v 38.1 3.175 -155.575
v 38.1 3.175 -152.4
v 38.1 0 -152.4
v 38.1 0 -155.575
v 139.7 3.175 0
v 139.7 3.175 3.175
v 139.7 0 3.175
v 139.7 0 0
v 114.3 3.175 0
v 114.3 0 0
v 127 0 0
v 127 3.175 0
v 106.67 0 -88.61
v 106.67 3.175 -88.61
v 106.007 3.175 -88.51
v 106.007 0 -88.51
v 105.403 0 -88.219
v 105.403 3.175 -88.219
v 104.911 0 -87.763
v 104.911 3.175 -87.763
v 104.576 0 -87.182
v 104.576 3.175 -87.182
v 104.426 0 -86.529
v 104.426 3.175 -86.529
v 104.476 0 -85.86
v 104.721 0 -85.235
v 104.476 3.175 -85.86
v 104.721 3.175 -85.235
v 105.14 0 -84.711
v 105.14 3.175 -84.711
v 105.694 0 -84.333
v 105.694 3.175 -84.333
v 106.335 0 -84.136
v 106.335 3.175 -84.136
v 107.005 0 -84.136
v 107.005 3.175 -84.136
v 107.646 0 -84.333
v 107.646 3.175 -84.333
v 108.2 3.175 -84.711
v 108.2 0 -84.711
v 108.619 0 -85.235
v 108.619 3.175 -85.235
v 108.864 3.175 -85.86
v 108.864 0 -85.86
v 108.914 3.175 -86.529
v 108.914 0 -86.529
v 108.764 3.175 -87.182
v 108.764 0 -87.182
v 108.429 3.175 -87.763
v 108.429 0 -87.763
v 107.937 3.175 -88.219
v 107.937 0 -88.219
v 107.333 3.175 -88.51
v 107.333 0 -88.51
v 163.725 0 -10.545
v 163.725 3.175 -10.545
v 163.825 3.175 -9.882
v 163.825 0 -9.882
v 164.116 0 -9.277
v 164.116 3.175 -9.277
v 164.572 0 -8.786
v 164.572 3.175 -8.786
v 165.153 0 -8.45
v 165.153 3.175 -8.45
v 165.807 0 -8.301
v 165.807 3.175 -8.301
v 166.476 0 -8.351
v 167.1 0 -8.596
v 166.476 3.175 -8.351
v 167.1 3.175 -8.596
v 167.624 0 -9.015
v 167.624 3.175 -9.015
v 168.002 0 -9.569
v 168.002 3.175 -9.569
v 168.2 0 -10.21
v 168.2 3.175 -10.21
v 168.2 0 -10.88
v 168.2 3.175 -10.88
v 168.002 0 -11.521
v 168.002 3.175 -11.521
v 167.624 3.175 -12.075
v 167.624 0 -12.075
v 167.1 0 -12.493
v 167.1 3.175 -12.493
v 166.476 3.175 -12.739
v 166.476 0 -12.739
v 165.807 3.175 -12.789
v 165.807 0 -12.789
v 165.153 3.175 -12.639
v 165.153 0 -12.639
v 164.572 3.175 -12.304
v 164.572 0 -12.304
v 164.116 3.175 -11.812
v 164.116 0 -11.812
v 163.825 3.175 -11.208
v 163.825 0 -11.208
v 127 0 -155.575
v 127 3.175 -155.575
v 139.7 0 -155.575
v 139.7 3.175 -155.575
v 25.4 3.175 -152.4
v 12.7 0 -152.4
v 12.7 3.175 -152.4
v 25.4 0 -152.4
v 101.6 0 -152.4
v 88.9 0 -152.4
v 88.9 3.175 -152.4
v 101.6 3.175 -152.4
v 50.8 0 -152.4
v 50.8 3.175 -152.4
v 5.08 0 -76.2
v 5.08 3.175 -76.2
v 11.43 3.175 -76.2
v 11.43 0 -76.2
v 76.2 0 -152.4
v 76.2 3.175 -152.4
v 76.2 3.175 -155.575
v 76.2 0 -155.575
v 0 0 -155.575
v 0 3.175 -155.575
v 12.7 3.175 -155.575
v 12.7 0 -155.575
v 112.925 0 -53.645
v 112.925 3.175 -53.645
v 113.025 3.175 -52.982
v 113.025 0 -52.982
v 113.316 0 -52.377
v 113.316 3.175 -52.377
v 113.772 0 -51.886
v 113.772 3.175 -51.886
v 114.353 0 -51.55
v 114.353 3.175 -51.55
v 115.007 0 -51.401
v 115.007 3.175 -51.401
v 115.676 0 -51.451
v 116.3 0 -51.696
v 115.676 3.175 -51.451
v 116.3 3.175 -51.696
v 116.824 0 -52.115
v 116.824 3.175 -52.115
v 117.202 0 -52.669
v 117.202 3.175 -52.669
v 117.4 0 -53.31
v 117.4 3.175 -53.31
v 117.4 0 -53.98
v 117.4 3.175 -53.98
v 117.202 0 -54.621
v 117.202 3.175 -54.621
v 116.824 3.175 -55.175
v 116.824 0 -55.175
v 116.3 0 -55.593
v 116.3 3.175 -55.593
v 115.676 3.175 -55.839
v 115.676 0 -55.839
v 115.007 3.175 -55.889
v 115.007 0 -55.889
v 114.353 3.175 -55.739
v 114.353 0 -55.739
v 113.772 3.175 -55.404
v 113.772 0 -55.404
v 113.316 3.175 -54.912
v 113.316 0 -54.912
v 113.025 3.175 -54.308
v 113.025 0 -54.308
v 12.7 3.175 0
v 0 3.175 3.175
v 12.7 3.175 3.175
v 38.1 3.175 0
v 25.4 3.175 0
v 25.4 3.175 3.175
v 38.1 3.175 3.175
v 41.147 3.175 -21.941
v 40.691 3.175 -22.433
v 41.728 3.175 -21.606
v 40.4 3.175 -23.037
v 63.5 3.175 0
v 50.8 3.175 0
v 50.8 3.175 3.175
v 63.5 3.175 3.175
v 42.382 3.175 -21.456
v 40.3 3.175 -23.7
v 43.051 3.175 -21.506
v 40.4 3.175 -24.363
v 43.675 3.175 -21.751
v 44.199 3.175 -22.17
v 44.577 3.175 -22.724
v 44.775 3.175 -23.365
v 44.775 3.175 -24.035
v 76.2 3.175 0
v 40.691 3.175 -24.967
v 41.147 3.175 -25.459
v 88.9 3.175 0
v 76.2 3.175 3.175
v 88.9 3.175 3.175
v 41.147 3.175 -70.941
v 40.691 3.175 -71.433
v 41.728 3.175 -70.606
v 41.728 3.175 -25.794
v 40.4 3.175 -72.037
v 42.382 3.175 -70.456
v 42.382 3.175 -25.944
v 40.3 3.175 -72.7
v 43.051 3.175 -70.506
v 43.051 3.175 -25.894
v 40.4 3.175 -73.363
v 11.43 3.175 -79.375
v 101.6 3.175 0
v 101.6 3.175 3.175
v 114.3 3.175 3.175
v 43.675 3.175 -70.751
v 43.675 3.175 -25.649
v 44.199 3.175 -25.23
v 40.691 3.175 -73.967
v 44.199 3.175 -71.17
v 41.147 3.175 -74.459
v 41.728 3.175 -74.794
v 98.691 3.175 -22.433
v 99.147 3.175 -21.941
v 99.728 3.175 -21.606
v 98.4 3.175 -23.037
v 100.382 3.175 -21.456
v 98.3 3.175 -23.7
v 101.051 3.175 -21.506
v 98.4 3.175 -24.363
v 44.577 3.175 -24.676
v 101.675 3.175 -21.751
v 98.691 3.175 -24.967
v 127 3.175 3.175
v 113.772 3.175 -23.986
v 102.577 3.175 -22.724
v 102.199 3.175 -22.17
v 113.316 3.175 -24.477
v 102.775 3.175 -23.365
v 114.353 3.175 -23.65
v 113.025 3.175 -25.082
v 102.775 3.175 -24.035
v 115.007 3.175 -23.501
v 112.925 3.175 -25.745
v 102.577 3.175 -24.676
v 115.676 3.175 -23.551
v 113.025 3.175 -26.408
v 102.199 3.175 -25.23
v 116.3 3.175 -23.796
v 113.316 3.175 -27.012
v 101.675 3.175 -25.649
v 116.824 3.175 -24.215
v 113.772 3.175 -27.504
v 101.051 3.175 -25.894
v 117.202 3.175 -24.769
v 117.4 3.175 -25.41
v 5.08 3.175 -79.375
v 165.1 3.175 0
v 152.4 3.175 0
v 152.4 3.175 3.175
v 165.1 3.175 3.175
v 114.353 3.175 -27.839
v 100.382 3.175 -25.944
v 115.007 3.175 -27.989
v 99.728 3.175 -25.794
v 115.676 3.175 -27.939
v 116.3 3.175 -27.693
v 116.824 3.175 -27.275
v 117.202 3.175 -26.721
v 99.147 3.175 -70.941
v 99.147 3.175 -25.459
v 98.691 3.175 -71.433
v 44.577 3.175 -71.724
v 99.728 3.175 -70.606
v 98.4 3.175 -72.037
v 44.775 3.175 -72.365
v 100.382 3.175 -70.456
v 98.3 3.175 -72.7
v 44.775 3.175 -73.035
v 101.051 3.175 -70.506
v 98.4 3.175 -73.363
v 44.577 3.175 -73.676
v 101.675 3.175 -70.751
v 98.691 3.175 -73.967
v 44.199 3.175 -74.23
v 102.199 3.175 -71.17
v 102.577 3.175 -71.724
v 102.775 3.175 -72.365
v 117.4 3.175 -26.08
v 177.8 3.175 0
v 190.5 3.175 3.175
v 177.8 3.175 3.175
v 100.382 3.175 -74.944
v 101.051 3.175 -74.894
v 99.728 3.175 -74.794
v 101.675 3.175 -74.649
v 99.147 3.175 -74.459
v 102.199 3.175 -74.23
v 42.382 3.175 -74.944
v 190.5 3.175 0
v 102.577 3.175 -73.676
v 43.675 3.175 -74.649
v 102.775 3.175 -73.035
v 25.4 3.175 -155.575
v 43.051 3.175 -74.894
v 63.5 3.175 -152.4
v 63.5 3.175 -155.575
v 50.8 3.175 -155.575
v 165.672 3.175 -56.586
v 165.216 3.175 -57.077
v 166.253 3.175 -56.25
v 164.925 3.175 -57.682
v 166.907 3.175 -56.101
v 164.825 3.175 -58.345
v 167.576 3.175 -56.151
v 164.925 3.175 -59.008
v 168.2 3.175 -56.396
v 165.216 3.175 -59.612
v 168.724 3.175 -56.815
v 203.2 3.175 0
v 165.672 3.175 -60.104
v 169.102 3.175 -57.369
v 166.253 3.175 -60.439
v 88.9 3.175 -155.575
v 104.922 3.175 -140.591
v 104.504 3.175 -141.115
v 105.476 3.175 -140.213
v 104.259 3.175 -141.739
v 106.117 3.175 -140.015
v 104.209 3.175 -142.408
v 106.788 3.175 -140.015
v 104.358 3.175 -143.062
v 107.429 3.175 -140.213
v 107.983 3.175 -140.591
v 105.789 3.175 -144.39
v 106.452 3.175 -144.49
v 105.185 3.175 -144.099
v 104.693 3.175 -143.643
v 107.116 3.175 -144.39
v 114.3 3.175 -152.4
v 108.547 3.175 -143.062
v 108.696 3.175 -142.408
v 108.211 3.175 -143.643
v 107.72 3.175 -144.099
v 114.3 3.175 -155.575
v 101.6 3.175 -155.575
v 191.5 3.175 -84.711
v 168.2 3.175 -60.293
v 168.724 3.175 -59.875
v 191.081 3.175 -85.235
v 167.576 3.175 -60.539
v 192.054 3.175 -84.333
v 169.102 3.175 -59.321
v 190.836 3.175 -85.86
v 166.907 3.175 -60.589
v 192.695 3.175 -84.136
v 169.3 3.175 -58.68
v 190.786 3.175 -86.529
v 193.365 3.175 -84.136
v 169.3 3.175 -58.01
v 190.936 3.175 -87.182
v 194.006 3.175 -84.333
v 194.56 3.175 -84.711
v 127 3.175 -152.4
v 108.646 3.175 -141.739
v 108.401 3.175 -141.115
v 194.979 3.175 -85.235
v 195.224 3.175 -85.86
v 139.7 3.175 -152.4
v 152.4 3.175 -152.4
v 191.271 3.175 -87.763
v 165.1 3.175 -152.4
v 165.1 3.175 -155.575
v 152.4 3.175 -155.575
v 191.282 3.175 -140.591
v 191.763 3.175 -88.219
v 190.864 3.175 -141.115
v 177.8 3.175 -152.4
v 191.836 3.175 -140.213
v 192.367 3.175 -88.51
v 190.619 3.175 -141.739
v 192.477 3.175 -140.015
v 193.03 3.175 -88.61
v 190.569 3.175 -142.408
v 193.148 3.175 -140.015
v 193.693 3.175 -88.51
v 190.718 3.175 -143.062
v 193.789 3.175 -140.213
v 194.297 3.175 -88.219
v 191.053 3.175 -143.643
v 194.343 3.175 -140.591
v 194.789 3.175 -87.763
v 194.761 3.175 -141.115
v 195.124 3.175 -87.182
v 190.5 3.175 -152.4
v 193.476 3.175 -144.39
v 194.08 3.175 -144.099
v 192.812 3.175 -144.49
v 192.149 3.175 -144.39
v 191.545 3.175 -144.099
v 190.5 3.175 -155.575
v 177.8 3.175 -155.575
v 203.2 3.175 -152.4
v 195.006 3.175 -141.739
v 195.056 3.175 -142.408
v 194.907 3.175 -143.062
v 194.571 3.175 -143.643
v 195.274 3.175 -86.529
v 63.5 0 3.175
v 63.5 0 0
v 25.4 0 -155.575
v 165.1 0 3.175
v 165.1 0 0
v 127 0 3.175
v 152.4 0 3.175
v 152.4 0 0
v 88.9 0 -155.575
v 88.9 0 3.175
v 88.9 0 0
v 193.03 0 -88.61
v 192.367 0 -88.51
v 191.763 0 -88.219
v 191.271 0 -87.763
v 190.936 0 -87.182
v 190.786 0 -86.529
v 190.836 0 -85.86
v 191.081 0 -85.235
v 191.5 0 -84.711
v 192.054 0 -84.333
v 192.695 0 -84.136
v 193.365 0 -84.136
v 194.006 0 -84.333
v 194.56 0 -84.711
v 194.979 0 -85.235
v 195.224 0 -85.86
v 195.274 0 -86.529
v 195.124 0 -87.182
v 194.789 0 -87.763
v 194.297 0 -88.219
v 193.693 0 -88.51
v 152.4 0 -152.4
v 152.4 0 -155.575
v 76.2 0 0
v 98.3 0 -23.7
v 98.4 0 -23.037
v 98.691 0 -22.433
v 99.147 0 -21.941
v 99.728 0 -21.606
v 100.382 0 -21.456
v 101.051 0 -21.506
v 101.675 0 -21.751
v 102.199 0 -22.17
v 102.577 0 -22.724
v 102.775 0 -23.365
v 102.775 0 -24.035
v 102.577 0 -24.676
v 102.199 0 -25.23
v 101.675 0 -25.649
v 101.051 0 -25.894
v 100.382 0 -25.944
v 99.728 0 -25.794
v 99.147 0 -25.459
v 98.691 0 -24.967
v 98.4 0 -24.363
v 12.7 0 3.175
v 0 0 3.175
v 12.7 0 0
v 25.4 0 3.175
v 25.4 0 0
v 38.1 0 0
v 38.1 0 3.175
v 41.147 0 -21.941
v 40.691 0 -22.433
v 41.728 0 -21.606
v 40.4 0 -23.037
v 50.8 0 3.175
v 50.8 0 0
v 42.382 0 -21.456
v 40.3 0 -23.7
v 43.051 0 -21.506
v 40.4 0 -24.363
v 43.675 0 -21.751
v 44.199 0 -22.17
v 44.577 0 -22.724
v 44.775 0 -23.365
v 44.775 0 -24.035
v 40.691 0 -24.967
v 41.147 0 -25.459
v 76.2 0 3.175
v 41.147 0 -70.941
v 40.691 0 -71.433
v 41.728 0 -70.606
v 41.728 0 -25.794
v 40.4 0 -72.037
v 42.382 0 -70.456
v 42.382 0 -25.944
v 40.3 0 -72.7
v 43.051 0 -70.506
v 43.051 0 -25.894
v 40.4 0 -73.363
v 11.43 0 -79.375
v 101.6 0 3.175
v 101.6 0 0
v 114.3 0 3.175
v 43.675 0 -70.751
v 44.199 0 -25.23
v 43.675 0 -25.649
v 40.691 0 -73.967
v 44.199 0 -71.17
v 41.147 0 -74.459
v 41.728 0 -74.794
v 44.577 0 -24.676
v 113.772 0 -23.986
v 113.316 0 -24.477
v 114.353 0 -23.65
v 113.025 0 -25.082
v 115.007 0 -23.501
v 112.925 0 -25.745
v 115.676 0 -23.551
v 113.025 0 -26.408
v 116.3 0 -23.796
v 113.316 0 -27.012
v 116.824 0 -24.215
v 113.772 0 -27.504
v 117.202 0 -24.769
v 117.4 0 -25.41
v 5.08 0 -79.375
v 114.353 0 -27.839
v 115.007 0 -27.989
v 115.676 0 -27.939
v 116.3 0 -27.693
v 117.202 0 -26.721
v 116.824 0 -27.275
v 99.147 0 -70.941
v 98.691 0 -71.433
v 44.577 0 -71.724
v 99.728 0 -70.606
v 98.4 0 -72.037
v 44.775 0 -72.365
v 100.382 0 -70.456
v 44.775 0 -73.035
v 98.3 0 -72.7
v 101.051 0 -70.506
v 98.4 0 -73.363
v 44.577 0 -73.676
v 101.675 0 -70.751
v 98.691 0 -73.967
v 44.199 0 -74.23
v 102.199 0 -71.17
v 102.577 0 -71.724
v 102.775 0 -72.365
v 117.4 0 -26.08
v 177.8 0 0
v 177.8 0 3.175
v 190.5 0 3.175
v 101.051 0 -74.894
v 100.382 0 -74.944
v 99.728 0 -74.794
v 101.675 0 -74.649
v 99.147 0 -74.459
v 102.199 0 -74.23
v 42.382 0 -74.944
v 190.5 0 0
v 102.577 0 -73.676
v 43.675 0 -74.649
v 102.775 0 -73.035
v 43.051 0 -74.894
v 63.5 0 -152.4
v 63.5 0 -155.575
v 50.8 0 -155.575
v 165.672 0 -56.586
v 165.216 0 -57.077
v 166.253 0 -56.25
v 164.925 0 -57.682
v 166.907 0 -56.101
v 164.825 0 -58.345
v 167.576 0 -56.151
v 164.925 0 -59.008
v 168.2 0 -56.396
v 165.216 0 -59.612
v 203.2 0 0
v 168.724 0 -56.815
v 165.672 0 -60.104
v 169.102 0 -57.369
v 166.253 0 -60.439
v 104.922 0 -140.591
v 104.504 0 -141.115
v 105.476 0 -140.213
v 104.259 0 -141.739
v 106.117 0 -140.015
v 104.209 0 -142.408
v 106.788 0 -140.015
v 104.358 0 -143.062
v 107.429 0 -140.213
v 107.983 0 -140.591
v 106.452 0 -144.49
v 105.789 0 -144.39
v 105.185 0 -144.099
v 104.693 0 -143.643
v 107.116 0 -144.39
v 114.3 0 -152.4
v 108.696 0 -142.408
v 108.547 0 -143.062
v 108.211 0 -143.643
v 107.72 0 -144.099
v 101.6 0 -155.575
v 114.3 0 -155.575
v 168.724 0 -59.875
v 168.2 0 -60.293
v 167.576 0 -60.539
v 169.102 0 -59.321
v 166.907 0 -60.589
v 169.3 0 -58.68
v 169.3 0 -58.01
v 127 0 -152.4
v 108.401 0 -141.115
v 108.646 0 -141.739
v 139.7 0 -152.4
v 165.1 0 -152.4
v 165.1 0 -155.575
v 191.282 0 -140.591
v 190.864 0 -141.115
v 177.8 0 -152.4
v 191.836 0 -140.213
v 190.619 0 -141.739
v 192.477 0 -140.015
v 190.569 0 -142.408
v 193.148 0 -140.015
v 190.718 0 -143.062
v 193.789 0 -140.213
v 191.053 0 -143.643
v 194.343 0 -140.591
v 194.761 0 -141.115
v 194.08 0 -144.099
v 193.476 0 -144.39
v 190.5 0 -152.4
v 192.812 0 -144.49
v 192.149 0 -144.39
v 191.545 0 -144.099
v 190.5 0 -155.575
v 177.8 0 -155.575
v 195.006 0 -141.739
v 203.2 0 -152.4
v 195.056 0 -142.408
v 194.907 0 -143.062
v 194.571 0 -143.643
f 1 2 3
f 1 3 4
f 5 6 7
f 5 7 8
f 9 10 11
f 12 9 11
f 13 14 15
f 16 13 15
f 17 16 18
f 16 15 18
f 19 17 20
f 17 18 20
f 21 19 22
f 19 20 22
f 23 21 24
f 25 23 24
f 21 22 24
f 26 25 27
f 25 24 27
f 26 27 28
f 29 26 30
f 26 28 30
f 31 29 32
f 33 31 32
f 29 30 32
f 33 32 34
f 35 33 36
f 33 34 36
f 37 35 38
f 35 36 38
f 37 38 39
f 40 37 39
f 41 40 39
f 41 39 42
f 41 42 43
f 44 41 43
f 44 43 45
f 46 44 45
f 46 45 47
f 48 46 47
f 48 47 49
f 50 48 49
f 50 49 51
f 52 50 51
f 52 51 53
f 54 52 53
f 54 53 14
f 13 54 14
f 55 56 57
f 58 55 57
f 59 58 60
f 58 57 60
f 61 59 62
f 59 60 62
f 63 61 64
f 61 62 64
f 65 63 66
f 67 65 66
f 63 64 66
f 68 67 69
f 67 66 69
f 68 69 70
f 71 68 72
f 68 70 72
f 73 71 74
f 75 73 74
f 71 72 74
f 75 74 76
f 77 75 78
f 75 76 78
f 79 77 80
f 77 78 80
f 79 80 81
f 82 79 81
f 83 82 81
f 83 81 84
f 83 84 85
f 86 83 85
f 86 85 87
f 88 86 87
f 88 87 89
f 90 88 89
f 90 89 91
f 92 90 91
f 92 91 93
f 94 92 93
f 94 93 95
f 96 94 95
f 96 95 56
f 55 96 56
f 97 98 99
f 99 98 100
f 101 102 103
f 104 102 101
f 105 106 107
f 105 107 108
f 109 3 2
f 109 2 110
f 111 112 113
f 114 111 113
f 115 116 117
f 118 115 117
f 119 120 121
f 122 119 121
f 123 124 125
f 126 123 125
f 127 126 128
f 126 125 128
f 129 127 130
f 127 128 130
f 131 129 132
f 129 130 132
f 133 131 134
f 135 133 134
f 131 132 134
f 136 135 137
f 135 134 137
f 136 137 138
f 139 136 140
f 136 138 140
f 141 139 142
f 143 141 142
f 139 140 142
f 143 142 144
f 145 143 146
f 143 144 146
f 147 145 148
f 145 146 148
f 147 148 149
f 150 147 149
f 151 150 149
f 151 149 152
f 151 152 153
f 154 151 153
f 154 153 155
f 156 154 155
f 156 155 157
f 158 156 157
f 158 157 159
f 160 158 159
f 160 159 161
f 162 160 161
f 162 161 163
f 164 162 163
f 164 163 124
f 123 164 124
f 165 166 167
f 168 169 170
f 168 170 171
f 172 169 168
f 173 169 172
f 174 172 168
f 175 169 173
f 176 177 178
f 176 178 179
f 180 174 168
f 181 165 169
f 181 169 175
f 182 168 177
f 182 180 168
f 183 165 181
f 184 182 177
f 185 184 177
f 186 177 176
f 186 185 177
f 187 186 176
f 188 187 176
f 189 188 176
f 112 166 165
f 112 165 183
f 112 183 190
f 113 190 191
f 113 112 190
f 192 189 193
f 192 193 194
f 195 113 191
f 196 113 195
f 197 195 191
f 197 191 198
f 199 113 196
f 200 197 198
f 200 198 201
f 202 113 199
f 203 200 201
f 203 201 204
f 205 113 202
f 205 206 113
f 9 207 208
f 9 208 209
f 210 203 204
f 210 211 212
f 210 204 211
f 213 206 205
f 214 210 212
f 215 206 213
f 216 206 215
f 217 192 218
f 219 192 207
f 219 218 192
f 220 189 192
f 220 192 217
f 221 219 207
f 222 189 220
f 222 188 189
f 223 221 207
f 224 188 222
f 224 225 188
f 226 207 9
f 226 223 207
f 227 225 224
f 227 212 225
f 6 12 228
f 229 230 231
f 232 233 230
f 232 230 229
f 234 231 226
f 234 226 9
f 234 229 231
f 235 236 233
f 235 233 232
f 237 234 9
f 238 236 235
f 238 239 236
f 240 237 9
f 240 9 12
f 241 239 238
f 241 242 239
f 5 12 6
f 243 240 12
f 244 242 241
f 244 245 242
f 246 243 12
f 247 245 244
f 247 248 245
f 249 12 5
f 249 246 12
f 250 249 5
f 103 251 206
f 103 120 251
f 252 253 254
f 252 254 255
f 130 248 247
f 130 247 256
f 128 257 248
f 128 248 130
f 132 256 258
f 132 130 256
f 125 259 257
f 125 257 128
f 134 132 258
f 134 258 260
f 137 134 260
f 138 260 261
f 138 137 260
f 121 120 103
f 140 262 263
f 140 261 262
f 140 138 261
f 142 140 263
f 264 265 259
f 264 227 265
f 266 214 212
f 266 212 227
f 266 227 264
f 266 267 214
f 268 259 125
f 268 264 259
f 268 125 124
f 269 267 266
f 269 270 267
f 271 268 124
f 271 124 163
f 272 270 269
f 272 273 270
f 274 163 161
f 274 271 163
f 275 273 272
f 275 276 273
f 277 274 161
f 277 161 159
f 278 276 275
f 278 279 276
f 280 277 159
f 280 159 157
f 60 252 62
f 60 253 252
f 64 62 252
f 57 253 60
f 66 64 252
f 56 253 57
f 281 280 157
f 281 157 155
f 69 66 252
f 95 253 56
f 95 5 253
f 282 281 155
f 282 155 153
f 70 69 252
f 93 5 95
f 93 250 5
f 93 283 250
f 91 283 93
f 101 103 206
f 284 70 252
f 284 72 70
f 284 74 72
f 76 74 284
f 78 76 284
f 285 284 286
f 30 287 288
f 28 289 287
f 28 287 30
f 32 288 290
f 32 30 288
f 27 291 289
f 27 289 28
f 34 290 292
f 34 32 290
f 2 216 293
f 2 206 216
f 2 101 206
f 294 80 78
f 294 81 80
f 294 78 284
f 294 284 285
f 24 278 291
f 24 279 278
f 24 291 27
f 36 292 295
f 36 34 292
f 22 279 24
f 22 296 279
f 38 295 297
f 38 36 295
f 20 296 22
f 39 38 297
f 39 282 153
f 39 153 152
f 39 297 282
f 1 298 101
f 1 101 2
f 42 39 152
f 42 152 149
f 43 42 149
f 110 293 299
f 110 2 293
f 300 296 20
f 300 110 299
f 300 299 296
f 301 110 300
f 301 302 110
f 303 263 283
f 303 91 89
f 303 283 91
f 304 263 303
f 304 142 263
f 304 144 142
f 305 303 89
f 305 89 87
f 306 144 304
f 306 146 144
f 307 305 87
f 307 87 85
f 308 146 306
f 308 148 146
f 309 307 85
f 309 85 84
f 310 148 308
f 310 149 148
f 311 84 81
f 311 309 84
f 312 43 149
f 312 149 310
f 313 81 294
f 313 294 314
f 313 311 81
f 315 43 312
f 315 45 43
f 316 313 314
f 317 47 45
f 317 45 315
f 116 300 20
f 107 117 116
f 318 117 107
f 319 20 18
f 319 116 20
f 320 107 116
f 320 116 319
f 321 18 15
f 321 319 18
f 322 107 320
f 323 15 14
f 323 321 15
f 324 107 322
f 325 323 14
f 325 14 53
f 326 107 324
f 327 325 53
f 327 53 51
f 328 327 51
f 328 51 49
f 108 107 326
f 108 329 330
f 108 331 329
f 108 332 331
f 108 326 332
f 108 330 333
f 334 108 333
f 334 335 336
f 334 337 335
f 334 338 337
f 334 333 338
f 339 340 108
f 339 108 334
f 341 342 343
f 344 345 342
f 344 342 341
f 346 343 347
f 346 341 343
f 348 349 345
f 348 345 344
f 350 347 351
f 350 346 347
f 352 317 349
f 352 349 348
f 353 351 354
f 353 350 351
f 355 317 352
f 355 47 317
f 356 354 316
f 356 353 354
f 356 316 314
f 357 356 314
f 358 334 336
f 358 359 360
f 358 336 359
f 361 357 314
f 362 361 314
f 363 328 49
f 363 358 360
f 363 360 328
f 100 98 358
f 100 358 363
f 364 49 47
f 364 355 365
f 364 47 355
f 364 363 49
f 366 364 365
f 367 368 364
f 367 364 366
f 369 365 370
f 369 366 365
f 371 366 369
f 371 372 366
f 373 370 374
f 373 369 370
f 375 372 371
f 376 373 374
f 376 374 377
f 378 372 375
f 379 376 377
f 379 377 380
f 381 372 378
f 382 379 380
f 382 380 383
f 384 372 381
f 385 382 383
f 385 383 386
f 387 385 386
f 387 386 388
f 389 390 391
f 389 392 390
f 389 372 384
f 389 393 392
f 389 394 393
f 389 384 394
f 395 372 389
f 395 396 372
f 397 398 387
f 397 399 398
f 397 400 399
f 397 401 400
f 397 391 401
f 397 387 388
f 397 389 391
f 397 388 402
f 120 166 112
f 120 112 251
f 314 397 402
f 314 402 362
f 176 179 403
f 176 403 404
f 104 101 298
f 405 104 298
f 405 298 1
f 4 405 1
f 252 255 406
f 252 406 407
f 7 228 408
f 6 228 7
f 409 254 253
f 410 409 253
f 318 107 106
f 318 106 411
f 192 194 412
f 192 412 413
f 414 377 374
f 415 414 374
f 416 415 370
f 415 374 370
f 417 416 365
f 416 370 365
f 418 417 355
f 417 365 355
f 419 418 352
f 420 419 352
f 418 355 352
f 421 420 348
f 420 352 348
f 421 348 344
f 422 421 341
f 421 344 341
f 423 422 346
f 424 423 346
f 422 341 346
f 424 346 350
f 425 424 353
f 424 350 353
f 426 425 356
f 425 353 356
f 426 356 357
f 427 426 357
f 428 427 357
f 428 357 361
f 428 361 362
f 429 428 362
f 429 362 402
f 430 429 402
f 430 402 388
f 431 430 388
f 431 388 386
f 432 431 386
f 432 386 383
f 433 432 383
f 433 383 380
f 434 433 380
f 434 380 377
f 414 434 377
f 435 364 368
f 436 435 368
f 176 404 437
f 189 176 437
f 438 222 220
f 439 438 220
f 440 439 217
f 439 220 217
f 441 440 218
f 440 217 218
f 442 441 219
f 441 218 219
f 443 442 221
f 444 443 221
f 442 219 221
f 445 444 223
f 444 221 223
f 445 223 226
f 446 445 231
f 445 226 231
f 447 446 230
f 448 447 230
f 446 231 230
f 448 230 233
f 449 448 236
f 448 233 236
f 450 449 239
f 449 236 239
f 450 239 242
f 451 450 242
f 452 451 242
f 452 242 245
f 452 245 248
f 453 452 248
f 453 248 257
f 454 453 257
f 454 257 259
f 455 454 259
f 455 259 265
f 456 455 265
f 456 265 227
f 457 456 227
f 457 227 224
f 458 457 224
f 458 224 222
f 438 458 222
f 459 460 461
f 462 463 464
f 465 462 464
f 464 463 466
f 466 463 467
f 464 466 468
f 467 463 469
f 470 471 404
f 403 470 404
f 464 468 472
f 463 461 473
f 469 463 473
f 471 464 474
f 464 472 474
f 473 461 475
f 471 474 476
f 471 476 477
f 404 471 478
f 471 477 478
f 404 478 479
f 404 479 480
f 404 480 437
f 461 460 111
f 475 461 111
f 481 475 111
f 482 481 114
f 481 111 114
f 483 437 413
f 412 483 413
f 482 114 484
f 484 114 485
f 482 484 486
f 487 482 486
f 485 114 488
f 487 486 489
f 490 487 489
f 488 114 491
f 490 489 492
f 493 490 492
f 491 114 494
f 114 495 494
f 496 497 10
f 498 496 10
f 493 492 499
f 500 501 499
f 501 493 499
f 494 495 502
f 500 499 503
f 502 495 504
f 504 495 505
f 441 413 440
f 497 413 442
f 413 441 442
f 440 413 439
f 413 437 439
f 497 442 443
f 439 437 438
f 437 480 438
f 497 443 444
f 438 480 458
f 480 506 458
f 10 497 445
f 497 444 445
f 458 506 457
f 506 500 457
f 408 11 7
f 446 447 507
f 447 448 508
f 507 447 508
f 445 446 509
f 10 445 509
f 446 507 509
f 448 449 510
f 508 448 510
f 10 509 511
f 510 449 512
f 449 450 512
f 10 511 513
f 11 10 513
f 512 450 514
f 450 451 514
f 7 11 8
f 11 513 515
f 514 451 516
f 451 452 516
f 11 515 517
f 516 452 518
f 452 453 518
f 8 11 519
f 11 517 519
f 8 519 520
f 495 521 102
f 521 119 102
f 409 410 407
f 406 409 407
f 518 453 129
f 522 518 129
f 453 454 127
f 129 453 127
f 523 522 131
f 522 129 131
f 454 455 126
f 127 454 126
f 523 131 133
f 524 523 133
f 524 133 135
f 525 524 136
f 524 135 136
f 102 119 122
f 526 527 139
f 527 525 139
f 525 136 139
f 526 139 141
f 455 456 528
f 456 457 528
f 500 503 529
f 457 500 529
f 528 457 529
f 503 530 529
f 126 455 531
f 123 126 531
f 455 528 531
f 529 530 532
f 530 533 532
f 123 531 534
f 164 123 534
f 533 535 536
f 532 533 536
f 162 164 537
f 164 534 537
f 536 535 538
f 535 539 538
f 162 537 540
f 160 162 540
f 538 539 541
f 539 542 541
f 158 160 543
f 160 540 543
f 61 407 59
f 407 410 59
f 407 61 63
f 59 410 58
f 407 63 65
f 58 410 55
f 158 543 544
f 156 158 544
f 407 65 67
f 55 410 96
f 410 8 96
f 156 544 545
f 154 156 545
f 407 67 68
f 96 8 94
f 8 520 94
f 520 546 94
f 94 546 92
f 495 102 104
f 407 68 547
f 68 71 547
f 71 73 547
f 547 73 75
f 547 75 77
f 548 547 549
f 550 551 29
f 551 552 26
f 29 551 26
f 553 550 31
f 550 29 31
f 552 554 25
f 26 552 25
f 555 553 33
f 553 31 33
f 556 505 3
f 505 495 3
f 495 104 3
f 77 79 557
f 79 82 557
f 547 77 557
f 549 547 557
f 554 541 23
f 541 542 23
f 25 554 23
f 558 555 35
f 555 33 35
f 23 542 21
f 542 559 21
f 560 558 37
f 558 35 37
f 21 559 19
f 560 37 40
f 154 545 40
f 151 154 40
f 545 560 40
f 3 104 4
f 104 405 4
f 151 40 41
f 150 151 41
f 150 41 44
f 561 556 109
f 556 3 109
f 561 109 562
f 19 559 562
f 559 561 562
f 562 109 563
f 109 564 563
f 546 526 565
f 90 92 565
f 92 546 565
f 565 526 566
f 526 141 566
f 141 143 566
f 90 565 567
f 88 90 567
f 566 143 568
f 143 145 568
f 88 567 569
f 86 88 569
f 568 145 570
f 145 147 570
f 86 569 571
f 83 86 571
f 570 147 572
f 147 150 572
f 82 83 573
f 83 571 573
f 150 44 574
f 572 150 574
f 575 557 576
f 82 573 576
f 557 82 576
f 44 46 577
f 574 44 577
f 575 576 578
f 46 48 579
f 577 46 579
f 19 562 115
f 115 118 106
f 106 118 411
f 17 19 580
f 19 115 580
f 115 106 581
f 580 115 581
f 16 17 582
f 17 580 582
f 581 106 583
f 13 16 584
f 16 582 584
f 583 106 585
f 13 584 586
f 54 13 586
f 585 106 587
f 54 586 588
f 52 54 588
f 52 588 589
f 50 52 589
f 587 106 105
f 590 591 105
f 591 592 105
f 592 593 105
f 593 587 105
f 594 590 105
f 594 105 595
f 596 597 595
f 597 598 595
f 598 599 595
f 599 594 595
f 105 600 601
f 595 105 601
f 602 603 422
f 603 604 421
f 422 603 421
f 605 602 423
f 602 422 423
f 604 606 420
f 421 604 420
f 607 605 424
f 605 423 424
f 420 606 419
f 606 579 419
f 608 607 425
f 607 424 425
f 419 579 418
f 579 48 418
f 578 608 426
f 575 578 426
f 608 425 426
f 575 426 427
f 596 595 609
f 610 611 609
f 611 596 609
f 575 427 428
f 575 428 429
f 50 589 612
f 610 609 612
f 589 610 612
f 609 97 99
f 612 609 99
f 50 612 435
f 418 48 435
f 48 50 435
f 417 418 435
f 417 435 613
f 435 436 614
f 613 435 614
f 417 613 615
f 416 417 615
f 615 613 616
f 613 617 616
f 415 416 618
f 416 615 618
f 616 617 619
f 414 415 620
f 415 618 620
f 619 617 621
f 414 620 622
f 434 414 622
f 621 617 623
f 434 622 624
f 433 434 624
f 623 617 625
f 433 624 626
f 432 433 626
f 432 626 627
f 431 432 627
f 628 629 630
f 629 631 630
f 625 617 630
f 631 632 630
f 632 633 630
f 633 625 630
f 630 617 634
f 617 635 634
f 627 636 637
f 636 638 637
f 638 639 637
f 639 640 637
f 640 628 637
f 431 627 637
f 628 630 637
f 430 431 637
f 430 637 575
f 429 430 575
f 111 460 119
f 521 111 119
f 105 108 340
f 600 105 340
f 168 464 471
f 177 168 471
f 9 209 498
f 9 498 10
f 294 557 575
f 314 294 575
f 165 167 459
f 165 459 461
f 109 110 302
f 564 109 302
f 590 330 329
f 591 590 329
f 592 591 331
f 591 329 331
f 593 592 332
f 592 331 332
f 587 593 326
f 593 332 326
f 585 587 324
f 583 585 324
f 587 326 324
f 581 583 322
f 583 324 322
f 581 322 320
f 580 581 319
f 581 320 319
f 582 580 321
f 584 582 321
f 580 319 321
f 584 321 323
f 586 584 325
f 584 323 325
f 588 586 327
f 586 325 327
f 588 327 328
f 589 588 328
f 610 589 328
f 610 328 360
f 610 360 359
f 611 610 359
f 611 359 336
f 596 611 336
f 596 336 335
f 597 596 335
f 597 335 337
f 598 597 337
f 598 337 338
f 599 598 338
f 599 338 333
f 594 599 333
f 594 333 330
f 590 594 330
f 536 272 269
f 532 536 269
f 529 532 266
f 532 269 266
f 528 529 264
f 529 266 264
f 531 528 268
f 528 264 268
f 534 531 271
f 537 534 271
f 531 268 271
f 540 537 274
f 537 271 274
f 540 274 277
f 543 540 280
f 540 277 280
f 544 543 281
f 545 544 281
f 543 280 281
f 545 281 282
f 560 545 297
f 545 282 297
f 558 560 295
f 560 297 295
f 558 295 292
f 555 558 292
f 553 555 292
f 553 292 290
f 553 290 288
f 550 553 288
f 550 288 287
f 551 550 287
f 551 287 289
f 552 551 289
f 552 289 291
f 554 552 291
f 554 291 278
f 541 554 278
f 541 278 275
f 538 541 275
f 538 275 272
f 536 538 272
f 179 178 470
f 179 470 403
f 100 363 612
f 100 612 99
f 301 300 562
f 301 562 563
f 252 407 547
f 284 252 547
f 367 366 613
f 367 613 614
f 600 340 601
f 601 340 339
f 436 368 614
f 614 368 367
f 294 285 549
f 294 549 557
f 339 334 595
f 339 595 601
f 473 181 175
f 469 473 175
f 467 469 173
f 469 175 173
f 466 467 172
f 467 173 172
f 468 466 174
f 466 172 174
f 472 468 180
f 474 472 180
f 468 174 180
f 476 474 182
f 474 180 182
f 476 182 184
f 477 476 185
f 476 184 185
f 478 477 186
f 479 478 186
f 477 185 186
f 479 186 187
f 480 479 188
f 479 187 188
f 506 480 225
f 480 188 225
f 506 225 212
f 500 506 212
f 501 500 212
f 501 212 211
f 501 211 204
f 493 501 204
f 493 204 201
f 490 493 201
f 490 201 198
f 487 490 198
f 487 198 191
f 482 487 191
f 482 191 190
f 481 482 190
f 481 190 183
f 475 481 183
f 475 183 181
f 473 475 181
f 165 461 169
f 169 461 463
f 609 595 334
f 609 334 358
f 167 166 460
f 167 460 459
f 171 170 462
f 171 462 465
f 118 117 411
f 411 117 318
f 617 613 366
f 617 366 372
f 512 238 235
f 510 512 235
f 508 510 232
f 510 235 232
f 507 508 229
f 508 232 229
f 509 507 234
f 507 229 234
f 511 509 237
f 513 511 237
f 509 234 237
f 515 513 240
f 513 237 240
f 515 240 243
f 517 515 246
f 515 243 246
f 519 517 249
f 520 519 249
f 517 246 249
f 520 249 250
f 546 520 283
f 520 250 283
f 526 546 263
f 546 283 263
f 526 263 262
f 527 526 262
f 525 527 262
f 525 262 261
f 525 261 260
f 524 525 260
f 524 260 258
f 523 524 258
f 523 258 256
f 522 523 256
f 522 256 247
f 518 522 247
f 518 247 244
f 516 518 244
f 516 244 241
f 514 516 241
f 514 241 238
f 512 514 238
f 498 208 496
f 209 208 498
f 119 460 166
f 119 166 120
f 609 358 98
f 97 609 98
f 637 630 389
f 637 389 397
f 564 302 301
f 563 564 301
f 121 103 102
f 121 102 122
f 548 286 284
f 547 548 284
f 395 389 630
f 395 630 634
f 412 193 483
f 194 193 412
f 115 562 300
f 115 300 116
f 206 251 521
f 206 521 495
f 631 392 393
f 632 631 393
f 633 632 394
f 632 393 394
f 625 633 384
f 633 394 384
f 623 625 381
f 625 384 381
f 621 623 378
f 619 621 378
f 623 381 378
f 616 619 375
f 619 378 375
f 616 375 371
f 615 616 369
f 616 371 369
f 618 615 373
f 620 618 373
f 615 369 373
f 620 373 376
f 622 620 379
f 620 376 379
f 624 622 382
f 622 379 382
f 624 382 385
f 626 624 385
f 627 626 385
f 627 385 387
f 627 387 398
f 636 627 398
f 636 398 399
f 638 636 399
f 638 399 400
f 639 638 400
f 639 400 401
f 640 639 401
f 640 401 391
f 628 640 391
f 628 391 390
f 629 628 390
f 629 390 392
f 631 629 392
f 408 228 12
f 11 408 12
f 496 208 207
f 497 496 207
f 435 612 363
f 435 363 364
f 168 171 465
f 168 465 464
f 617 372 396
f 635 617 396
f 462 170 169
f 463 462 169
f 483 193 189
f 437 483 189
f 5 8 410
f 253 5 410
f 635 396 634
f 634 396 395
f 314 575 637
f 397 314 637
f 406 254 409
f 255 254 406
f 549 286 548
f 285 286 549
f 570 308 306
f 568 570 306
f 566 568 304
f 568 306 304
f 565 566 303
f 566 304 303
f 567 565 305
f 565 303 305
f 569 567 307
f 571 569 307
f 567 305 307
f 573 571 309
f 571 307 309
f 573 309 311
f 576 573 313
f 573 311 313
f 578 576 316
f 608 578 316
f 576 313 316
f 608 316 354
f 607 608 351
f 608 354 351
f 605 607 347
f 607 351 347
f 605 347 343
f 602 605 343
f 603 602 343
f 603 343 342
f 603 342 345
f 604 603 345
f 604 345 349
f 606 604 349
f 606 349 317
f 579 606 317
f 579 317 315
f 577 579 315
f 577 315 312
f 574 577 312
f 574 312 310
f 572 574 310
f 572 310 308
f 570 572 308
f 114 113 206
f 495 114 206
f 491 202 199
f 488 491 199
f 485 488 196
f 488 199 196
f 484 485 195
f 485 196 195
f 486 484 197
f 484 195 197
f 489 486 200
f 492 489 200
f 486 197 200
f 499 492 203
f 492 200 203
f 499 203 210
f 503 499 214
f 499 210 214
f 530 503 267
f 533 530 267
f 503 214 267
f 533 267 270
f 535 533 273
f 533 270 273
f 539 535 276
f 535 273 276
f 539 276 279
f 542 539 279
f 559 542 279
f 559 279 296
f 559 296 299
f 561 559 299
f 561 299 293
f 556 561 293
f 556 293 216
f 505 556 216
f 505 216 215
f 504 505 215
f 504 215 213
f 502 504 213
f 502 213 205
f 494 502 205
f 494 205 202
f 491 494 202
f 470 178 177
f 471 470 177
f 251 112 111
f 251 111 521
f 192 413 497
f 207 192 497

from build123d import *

# Parameters (mm, degrees)
SKETCH1_W               = 203.2
SKETCH1_H               = 152.4
BOSS_EXTRUDE1_DEPTH     = 3.175
SKETCH2_W               = 12.7
SKETCH2_H               = 3.175
BOSS_EXTRUDE2_DEPTH     = 3.175
BOSS_EXTRUDE2_2_DEPTH   = 3.175
BOSS_EXTRUDE2_3_DEPTH   = 3.175
BOSS_EXTRUDE2_4_DEPTH   = 3.175
BOSS_EXTRUDE2_5_DEPTH   = 3.175
BOSS_EXTRUDE2_6_DEPTH   = 3.175
BOSS_EXTRUDE2_7_DEPTH   = 3.175
BOSS_EXTRUDE2_8_DEPTH   = 3.175
BOSS_EXTRUDE2_9_DEPTH   = 3.175
BOSS_EXTRUDE2_10_DEPTH  = 3.175
BOSS_EXTRUDE2_11_DEPTH  = 3.175
BOSS_EXTRUDE2_12_DEPTH  = 3.175
BOSS_EXTRUDE2_13_DEPTH  = 3.175
BOSS_EXTRUDE2_14_DEPTH  = 3.175
BOSS_EXTRUDE2_15_DEPTH  = 3.175
BOSS_EXTRUDE2_16_DEPTH  = 3.175
SKETCH4_R               = 2.249999945
CUT_EXTRUDE1_DEPTH      = 4.175
SKETCH5_R               = 2.249999945
CUT_EXTRUDE2_DEPTH      = 4.175
SKETCH10_R              = 2.249999945
CUT_EXTRUDE3_DEPTH      = 1
CUT_EXTRUDE3_DEPTH_BACK = 4.175
SKETCH11_W              = 6.35
SKETCH11_H              = 3.175
CUT_EXTRUDE4_DEPTH      = 4.175


with BuildPart() as part:
    # Sketch1 → Boss-Extrude1 (new body)
    with BuildSketch(Plane(origin=(0, 0, 0), x_dir=(1, 0, 0), z_dir=(0, 1, 0))):
        with Locations((101.6, 76.2)):
            Rectangle(SKETCH1_W, SKETCH1_H)
    extrude(amount=BOSS_EXTRUDE1_DEPTH)

    # Sketch4 → Cut-Extrude1 (cut, through all)
    with BuildSketch(Plane(origin=(163.318517222, 3.175, 18.128898402), x_dir=(-1, 0, 0), z_dir=(0, 1, 0))):
        with Locations((62.768517222, -41.828898402)):
            Circle(SKETCH4_R)
        with Locations((62.768517222, -90.828898402)):
            Circle(SKETCH4_R)
        with Locations((120.768517222, -90.828898402)):
            Circle(SKETCH4_R)
        with Locations((120.768517222, -41.828898402)):
            Circle(SKETCH4_R)
    extrude(amount=-CUT_EXTRUDE1_DEPTH, mode=Mode.SUBTRACT)

    # Sketch5 → Cut-Extrude2 (cut, through all)
    with BuildSketch(Plane(origin=(307.482010873, 3.175, -268.648993813), x_dir=(-1, 0, 0), z_dir=(0, 1, 0))):
        with Locations((140.407118473, 210.304081528)):
            Circle(SKETCH5_R)
        with Locations((141.507118473, 258.104081528)):
            Circle(SKETCH5_R)
        with Locations((192.307118473, 215.004081528)):
            Circle(SKETCH5_R)
        with Locations((192.307118473, 242.904081528)):
            Circle(SKETCH5_R)
    extrude(amount=-CUT_EXTRUDE2_DEPTH, mode=Mode.SUBTRACT)

    # Sketch10 → Cut-Extrude3 (cut, two sides)
    with BuildSketch(Plane(origin=(154.738240667, 3.175, -89.784200023), x_dir=(0, 0, -1), z_dir=(0, 1, 0))) as cut_extrude3_sk:
        with Locations((-3.423776116, 48.068240667)):
            Circle(SKETCH10_R)
        with Locations((52.455799977, 48.285900219)):
            Circle(SKETCH10_R)
        with Locations((-3.423776116, -38.291759333)):
            Circle(SKETCH10_R)
        with Locations((52.455799977, -38.074099781)):
            Circle(SKETCH10_R)
    extrude(amount=CUT_EXTRUDE3_DEPTH, mode=Mode.SUBTRACT)
    extrude(cut_extrude3_sk.sketch, amount=-CUT_EXTRUDE3_DEPTH_BACK, mode=Mode.SUBTRACT)


with BuildPart() as body_2:
    # Sketch2 → Boss-Extrude2 (new body)
    with BuildSketch(Plane(origin=(0, 3.175, 0), x_dir=(1, 0, 0), z_dir=(0, 1, 0))):
        with Locations((31.75, -1.5875)):
            Rectangle(SKETCH2_W, SKETCH2_H)
    extrude(amount=-BOSS_EXTRUDE2_DEPTH)


with BuildPart() as body_3:
    # Sketch2 → Boss-Extrude2 2 (new body)
    with BuildSketch(Plane(origin=(0, 3.175, 0), x_dir=(1, 0, 0), z_dir=(0, 1, 0))):
        with Locations((6.35, -1.5875)):
            Rectangle(SKETCH2_W, SKETCH2_H)
    extrude(amount=-BOSS_EXTRUDE2_2_DEPTH)


with BuildPart() as body_4:
    # Sketch2 → Boss-Extrude2 3 (new body)
    with BuildSketch(Plane(origin=(0, 3.175, 0), x_dir=(1, 0, 0), z_dir=(0, 1, 0))):
        with Locations((57.15, -1.5875)):
            Rectangle(SKETCH2_W, SKETCH2_H)
    extrude(amount=-BOSS_EXTRUDE2_3_DEPTH)


with BuildPart() as body_5:
    # Sketch2 → Boss-Extrude2 4 (new body)
    with BuildSketch(Plane(origin=(0, 3.175, 0), x_dir=(1, 0, 0), z_dir=(0, 1, 0))):
        with Locations((82.55, -1.5875)):
            Rectangle(SKETCH2_W, SKETCH2_H)
    extrude(amount=-BOSS_EXTRUDE2_4_DEPTH)


with BuildPart() as body_6:
    # Sketch2 → Boss-Extrude2 5 (new body)
    with BuildSketch(Plane(origin=(0, 3.175, 0), x_dir=(1, 0, 0), z_dir=(0, 1, 0))):
        with Locations((107.95, -1.5875)):
            Rectangle(SKETCH2_W, SKETCH2_H)
    extrude(amount=-BOSS_EXTRUDE2_5_DEPTH)


with BuildPart() as body_7:
    # Sketch2 → Boss-Extrude2 6 (new body)
    with BuildSketch(Plane(origin=(0, 3.175, 0), x_dir=(1, 0, 0), z_dir=(0, 1, 0))):
        with Locations((133.35, -1.5875)):
            Rectangle(SKETCH2_W, SKETCH2_H)
    extrude(amount=-BOSS_EXTRUDE2_6_DEPTH)


with BuildPart() as body_8:
    # Sketch2 → Boss-Extrude2 7 (new body)
    with BuildSketch(Plane(origin=(0, 3.175, 0), x_dir=(1, 0, 0), z_dir=(0, 1, 0))):
        with Locations((158.75, -1.5875)):
            Rectangle(SKETCH2_W, SKETCH2_H)
    extrude(amount=-BOSS_EXTRUDE2_7_DEPTH)


with BuildPart() as body_9:
    # Sketch2 → Boss-Extrude2 8 (new body)
    with BuildSketch(Plane(origin=(0, 3.175, 0), x_dir=(1, 0, 0), z_dir=(0, 1, 0))):
        with Locations((184.15, -1.5875)):
            Rectangle(SKETCH2_W, SKETCH2_H)
    extrude(amount=-BOSS_EXTRUDE2_8_DEPTH)


with BuildPart() as body_10:
    # Sketch2 → Boss-Extrude2 9 (new body)
    with BuildSketch(Plane(origin=(0, 3.175, 0), x_dir=(1, 0, 0), z_dir=(0, 1, 0))):
        with Locations((184.15, 153.9875)):
            Rectangle(SKETCH2_W, SKETCH2_H)
    extrude(amount=-BOSS_EXTRUDE2_9_DEPTH)


with BuildPart() as body_11:
    # Sketch2 → Boss-Extrude2 10 (new body)
    with BuildSketch(Plane(origin=(0, 3.175, 0), x_dir=(1, 0, 0), z_dir=(0, 1, 0))):
        with Locations((158.75, 153.9875)):
            Rectangle(SKETCH2_W, SKETCH2_H)
    extrude(amount=-BOSS_EXTRUDE2_10_DEPTH)


with BuildPart() as body_12:
    # Sketch2 → Boss-Extrude2 11 (new body)
    with BuildSketch(Plane(origin=(0, 3.175, 0), x_dir=(1, 0, 0), z_dir=(0, 1, 0))):
        with Locations((133.35, 153.9875)):
            Rectangle(SKETCH2_W, SKETCH2_H)
    extrude(amount=-BOSS_EXTRUDE2_11_DEPTH)


with BuildPart() as body_13:
    # Sketch2 → Boss-Extrude2 12 (new body)
    with BuildSketch(Plane(origin=(0, 3.175, 0), x_dir=(1, 0, 0), z_dir=(0, 1, 0))):
        with Locations((107.95, 153.9875)):
            Rectangle(SKETCH2_W, SKETCH2_H)
    extrude(amount=-BOSS_EXTRUDE2_12_DEPTH)


with BuildPart() as body_14:
    # Sketch2 → Boss-Extrude2 13 (new body)
    with BuildSketch(Plane(origin=(0, 3.175, 0), x_dir=(1, 0, 0), z_dir=(0, 1, 0))):
        with Locations((82.55, 153.9875)):
            Rectangle(SKETCH2_W, SKETCH2_H)
    extrude(amount=-BOSS_EXTRUDE2_13_DEPTH)


with BuildPart() as body_15:
    # Sketch2 → Boss-Extrude2 14 (new body)
    with BuildSketch(Plane(origin=(0, 3.175, 0), x_dir=(1, 0, 0), z_dir=(0, 1, 0))):
        with Locations((57.15, 153.9875)):
            Rectangle(SKETCH2_W, SKETCH2_H)
    extrude(amount=-BOSS_EXTRUDE2_14_DEPTH)


with BuildPart() as body_16:
    # Sketch2 → Boss-Extrude2 15 (new body)
    with BuildSketch(Plane(origin=(0, 3.175, 0), x_dir=(1, 0, 0), z_dir=(0, 1, 0))):
        with Locations((31.75, 153.9875)):
            Rectangle(SKETCH2_W, SKETCH2_H)
    extrude(amount=-BOSS_EXTRUDE2_15_DEPTH)


with BuildPart() as body_17:
    # Sketch2 → Boss-Extrude2 16 (new body)
    with BuildSketch(Plane(origin=(0, 3.175, 0), x_dir=(1, 0, 0), z_dir=(0, 1, 0))):
        with Locations((6.35, 153.9875)):
            Rectangle(SKETCH2_W, SKETCH2_H)
    extrude(amount=-BOSS_EXTRUDE2_16_DEPTH)


with BuildPart() as body_3_1:
    add(body_3.part)

    # Combine1: union body 4, body 6, body 8, body 10, body 12, body 14, body 16, body 17, part, body 2, body 5, body 7, body 9, body 11, body 13, body 15
    add(body_4.part)
    add(body_6.part)
    add(body_8.part)
    add(body_10.part)
    add(body_12.part)
    add(body_14.part)
    add(body_16.part)
    add(body_17.part)
    add(part.part)
    add(body_2.part)
    add(body_5.part)
    add(body_7.part)
    add(body_9.part)
    add(body_11.part)
    add(body_13.part)
    add(body_15.part)

    # Sketch11 → Cut-Extrude4 (cut, through all)
    with BuildSketch(Plane(origin=(0, 3.175, 0), x_dir=(1, 0, 0), z_dir=(0, 1, 0))):
        with Locations((8.255, 77.7875)):
            Rectangle(SKETCH11_W, SKETCH11_H)
    extrude(amount=-CUT_EXTRUDE4_DEPTH, mode=Mode.SUBTRACT)


solid = body_3_1.part
